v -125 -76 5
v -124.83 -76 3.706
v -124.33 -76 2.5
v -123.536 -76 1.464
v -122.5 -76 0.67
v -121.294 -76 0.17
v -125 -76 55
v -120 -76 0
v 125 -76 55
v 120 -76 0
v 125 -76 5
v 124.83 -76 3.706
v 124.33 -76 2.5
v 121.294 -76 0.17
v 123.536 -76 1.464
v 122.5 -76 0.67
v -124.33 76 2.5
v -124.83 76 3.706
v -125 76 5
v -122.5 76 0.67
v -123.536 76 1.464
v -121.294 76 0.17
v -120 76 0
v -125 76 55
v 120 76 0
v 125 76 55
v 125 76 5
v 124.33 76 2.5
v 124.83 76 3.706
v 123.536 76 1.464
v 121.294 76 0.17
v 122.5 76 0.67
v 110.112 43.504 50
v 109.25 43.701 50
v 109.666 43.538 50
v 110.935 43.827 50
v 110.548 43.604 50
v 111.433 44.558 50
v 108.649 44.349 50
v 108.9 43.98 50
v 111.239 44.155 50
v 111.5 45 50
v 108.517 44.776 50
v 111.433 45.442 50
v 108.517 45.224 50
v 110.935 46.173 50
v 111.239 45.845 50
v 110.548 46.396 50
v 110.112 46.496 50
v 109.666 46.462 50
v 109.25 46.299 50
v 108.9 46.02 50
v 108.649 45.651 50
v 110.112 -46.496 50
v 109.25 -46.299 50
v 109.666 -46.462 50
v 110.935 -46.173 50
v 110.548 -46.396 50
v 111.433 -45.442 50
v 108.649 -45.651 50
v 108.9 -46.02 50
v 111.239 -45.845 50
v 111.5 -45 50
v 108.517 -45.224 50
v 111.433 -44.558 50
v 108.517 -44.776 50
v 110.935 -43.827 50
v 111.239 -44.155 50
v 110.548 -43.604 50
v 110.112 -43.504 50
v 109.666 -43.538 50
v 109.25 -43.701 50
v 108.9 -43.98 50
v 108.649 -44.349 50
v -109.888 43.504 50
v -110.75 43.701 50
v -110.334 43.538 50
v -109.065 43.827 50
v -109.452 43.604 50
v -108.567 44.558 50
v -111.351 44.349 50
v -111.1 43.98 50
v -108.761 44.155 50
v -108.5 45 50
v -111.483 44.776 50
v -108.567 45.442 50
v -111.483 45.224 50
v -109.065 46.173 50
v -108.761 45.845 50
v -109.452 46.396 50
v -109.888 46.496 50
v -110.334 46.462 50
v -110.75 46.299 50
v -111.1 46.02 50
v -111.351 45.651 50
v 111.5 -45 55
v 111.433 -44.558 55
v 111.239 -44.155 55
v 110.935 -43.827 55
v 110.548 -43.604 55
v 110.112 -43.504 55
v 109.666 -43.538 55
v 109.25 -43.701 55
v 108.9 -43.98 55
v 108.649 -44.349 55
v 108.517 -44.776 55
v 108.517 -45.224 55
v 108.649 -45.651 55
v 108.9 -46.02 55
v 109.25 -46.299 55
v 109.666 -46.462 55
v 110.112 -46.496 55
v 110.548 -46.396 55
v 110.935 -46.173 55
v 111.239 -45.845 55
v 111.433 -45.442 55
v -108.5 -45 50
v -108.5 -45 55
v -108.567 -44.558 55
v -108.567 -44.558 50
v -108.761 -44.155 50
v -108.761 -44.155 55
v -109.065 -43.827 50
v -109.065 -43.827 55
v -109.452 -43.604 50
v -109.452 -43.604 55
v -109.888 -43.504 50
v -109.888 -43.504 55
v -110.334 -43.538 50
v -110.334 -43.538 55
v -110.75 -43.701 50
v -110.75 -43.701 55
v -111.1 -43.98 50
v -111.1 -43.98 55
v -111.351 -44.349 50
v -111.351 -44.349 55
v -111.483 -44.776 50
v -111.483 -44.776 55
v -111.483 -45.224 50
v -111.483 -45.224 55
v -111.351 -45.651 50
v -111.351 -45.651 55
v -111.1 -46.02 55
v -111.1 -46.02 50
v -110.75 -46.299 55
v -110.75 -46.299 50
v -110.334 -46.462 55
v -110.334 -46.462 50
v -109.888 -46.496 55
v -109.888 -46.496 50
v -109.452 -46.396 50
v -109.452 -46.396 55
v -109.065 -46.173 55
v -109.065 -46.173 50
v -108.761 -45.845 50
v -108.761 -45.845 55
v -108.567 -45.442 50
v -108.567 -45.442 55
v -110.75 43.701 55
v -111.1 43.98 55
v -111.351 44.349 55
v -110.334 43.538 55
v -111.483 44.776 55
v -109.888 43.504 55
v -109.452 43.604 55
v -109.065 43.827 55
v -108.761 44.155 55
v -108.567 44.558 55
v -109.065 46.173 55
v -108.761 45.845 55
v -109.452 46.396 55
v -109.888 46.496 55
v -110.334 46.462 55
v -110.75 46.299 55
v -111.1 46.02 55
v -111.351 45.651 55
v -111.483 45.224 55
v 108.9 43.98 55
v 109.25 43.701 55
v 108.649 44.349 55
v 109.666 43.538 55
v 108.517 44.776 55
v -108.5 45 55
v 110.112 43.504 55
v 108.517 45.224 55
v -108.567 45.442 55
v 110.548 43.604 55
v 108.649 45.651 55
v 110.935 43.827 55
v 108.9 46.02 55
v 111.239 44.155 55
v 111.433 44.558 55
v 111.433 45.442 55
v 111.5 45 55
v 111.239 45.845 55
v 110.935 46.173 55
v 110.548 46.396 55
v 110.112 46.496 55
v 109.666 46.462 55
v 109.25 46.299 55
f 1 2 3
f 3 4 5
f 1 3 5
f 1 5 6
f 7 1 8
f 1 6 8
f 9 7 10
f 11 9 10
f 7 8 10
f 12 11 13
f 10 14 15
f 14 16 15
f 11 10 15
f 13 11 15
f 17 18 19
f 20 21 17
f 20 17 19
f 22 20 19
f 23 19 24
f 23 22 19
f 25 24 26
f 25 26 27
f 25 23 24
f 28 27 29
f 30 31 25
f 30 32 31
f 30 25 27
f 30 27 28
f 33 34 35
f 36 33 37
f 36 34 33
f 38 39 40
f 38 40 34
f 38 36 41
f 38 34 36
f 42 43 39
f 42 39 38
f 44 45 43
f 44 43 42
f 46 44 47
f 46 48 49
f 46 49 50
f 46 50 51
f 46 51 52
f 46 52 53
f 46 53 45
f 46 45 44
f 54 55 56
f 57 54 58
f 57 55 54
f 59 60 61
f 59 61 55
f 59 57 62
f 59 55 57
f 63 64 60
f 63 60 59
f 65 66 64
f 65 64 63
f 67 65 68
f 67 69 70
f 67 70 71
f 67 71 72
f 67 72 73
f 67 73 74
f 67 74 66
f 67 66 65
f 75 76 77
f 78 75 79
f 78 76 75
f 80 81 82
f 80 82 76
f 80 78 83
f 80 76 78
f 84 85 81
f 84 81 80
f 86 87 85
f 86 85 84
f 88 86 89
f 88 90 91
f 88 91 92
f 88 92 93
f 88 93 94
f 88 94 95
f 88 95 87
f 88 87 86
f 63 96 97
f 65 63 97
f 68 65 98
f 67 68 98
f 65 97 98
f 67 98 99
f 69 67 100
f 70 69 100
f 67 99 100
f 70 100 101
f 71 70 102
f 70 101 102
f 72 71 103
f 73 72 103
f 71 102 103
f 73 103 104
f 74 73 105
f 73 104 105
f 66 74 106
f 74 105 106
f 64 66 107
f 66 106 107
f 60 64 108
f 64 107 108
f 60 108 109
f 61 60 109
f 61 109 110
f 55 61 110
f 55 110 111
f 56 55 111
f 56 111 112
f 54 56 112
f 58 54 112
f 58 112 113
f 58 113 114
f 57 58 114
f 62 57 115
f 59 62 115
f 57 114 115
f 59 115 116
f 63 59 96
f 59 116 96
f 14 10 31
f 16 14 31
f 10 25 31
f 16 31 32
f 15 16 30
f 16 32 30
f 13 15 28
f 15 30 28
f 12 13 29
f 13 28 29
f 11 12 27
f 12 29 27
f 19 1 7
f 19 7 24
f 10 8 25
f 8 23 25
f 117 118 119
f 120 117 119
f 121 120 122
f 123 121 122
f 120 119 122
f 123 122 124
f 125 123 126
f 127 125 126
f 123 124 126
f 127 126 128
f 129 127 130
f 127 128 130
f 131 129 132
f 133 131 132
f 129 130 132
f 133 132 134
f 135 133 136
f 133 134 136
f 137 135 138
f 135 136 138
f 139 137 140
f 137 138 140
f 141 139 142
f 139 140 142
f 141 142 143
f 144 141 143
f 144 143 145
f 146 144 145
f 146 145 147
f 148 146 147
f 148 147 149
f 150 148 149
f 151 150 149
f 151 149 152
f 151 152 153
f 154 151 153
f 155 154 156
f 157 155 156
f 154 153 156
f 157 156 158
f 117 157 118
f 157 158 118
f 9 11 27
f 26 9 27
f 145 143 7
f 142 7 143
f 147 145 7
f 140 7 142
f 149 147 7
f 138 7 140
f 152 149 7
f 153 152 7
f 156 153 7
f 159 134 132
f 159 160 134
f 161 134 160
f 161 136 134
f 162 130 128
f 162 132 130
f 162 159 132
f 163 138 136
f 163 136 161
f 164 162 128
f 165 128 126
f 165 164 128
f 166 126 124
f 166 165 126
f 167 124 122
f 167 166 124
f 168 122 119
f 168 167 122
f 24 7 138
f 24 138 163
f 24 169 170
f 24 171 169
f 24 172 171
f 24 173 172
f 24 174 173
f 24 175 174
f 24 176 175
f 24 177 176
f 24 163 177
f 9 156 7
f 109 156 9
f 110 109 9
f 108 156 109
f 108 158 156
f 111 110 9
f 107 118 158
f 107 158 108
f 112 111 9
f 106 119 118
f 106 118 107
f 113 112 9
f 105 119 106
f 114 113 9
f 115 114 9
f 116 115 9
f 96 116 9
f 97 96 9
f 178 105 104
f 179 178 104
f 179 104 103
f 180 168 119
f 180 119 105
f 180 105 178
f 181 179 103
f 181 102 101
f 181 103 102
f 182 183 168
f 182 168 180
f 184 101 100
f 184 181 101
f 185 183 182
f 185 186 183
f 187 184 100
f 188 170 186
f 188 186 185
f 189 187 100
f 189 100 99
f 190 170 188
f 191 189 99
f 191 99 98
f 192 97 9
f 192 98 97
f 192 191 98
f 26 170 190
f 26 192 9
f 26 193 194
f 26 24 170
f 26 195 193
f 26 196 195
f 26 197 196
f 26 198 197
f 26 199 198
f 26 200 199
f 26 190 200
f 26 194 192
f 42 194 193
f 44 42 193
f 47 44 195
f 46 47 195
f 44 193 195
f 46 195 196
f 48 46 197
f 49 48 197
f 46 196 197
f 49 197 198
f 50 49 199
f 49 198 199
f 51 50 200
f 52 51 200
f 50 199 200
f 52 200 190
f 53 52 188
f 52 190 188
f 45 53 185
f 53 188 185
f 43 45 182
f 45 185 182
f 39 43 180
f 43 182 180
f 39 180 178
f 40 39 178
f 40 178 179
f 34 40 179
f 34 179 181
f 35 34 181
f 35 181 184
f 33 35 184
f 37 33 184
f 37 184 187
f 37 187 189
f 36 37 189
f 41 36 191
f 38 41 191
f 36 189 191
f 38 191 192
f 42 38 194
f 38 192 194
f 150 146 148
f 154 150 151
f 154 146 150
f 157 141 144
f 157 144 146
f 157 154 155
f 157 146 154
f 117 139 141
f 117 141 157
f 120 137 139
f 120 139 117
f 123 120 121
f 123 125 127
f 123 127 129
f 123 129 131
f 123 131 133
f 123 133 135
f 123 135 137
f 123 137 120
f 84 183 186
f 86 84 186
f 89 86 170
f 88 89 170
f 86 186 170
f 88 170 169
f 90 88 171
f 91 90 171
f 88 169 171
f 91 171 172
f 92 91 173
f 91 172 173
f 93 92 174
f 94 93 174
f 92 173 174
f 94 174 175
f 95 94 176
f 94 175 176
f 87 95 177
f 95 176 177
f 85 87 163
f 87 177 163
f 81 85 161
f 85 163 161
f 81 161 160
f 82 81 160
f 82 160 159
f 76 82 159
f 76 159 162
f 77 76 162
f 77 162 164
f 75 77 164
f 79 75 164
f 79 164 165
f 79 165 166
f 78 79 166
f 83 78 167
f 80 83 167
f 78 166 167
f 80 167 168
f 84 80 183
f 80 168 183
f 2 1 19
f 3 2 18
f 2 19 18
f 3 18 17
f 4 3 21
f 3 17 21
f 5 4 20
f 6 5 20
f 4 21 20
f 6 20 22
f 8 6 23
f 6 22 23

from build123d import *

# Parameters (mm, degrees)
F0_W     = 250
F0_H     = 152
F1_DEPTH = 55
F2_R     = 1.5
F3_DEPTH = 5
F4_R     = 5


with BuildPart() as f1:
    # F0 (on Top) → F1 (new body)
    with BuildSketch(Plane.XY):
        Rectangle(F0_W, F0_H)
    extrude(amount=F1_DEPTH)

    # F2 (on face) → F3 (cut)
    with BuildSketch(Plane.XY.offset(55)):
        with Locations((-110, 45)):
            Circle(F2_R)
        with Locations((110, 45)):
            Circle(F2_R)
        with Locations((-110, -45)):
            Circle(F2_R)
        with Locations((110, -45)):
            Circle(F2_R)
    extrude(amount=-F3_DEPTH, mode=Mode.SUBTRACT)

    # F4
    f4_edges = [f1.edges().sort_by_distance(p)[0] for p in [
        (-125, 0, 0),
        (125, 0, 0),
    ]]
    fillet(f4_edges, radius=F4_R)


solid = f1.part
